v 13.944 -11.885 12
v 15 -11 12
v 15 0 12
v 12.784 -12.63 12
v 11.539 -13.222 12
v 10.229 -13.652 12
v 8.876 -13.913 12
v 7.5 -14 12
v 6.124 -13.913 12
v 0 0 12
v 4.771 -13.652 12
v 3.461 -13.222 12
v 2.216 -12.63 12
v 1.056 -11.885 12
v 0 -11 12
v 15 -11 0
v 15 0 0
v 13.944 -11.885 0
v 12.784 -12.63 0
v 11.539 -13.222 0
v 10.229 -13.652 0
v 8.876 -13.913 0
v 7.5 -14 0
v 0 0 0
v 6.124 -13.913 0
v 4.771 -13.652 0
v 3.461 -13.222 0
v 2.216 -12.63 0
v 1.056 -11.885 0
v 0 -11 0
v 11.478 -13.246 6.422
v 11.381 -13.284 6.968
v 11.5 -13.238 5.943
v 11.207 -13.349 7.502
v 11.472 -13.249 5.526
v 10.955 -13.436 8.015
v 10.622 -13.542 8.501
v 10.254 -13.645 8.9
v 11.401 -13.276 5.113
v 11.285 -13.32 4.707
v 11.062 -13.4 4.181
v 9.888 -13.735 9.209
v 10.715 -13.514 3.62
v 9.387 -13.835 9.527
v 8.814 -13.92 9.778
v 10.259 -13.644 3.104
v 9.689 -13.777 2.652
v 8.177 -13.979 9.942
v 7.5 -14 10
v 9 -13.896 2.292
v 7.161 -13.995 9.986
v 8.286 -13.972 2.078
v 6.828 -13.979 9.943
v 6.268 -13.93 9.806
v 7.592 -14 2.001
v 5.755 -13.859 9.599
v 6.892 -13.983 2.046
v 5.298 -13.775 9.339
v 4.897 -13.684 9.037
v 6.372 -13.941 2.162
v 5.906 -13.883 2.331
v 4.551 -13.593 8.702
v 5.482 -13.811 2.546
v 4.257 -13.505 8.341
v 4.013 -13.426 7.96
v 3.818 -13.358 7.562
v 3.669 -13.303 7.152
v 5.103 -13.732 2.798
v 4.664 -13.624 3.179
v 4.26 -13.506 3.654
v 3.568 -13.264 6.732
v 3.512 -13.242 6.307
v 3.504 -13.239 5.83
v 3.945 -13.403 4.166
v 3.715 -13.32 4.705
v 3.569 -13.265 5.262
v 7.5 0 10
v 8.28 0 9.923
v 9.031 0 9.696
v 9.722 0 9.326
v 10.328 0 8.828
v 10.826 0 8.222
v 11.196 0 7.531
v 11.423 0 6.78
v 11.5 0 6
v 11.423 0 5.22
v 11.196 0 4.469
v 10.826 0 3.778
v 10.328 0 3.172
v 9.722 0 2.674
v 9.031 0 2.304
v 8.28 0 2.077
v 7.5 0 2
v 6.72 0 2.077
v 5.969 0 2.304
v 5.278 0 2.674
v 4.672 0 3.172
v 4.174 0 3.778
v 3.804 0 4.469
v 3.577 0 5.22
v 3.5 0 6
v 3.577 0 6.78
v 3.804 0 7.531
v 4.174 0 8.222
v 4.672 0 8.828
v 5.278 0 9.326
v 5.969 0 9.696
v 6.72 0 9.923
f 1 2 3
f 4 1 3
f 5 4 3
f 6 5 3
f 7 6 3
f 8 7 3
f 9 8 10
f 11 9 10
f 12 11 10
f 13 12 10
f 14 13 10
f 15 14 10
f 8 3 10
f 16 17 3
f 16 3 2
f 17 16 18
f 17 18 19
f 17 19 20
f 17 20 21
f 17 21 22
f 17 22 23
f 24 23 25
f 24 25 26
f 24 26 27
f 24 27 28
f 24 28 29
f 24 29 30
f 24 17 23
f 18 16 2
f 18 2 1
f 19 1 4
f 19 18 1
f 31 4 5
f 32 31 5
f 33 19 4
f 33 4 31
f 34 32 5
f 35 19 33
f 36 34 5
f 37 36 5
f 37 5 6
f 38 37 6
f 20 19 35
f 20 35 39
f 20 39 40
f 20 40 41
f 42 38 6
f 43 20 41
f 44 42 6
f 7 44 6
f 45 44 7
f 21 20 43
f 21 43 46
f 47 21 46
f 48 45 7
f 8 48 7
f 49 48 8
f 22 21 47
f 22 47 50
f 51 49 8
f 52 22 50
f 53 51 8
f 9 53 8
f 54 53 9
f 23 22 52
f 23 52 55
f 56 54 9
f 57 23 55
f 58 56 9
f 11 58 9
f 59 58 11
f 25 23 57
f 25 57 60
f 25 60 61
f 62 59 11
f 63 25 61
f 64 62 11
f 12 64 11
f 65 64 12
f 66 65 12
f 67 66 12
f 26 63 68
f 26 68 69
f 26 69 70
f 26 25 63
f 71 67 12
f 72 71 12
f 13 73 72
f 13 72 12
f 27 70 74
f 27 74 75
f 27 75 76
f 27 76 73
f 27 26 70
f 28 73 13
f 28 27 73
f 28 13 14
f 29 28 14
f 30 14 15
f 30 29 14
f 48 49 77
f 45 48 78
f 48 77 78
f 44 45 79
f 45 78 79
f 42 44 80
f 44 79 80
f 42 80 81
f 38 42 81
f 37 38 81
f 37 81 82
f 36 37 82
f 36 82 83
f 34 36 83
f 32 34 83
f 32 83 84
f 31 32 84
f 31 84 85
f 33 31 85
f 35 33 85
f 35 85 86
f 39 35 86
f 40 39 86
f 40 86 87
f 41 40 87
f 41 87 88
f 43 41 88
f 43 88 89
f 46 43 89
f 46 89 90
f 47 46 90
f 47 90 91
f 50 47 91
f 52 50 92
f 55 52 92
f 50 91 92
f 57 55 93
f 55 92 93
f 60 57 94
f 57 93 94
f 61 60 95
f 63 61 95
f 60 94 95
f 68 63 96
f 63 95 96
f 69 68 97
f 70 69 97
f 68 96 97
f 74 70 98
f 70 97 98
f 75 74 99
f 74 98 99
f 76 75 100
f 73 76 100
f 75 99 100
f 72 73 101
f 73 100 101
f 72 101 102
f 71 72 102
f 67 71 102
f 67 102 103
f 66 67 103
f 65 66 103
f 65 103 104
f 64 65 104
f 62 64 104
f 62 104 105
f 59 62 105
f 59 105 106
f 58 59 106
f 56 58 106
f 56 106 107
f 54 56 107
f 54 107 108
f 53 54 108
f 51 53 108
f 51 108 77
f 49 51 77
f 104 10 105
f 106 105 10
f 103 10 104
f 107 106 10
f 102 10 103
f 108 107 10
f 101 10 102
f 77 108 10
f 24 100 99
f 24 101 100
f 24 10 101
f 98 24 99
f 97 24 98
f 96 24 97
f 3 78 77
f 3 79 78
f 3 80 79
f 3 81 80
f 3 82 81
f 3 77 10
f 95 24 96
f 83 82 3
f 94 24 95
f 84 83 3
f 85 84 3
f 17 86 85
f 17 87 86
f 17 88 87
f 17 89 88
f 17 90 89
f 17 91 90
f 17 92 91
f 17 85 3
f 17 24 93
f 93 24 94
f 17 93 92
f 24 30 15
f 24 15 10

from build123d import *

# Parameters (mm, degrees)
DODANIE_WYCI_GNI_CIE1_DEPTH = 12
SZKIC2_R                    = 4
WYTNIJ_WYCI_GNI_CIE1_DEPTH  = 21


with BuildPart() as part:
    # Szkic1 → Dodanie-wyciągnięcie1 (new body)
    with BuildSketch(Plane.XY):
        with BuildLine():
            Line((0, 0), (15, 0))
            Line((15, 0), (15, -11))
            ThreePointArc((15, -11), (7.5, -14), (0, -11))
            Line((0, -11), (0, 0))
        make_face()
    extrude(amount=DODANIE_WYCI_GNI_CIE1_DEPTH)

    # Szkic2 → Wytnij-wyciągnięcie1 (cut)
    with BuildSketch(Plane(origin=(0, 0, 0), x_dir=(1, 0, 0), z_dir=(0, 1, 0))):
        with Locations(Location((7.5, -6, 0), (0, 0, 270))):
            Circle(SZKIC2_R)
    extrude(amount=-WYTNIJ_WYCI_GNI_CIE1_DEPTH, mode=Mode.SUBTRACT)


solid = part.part
